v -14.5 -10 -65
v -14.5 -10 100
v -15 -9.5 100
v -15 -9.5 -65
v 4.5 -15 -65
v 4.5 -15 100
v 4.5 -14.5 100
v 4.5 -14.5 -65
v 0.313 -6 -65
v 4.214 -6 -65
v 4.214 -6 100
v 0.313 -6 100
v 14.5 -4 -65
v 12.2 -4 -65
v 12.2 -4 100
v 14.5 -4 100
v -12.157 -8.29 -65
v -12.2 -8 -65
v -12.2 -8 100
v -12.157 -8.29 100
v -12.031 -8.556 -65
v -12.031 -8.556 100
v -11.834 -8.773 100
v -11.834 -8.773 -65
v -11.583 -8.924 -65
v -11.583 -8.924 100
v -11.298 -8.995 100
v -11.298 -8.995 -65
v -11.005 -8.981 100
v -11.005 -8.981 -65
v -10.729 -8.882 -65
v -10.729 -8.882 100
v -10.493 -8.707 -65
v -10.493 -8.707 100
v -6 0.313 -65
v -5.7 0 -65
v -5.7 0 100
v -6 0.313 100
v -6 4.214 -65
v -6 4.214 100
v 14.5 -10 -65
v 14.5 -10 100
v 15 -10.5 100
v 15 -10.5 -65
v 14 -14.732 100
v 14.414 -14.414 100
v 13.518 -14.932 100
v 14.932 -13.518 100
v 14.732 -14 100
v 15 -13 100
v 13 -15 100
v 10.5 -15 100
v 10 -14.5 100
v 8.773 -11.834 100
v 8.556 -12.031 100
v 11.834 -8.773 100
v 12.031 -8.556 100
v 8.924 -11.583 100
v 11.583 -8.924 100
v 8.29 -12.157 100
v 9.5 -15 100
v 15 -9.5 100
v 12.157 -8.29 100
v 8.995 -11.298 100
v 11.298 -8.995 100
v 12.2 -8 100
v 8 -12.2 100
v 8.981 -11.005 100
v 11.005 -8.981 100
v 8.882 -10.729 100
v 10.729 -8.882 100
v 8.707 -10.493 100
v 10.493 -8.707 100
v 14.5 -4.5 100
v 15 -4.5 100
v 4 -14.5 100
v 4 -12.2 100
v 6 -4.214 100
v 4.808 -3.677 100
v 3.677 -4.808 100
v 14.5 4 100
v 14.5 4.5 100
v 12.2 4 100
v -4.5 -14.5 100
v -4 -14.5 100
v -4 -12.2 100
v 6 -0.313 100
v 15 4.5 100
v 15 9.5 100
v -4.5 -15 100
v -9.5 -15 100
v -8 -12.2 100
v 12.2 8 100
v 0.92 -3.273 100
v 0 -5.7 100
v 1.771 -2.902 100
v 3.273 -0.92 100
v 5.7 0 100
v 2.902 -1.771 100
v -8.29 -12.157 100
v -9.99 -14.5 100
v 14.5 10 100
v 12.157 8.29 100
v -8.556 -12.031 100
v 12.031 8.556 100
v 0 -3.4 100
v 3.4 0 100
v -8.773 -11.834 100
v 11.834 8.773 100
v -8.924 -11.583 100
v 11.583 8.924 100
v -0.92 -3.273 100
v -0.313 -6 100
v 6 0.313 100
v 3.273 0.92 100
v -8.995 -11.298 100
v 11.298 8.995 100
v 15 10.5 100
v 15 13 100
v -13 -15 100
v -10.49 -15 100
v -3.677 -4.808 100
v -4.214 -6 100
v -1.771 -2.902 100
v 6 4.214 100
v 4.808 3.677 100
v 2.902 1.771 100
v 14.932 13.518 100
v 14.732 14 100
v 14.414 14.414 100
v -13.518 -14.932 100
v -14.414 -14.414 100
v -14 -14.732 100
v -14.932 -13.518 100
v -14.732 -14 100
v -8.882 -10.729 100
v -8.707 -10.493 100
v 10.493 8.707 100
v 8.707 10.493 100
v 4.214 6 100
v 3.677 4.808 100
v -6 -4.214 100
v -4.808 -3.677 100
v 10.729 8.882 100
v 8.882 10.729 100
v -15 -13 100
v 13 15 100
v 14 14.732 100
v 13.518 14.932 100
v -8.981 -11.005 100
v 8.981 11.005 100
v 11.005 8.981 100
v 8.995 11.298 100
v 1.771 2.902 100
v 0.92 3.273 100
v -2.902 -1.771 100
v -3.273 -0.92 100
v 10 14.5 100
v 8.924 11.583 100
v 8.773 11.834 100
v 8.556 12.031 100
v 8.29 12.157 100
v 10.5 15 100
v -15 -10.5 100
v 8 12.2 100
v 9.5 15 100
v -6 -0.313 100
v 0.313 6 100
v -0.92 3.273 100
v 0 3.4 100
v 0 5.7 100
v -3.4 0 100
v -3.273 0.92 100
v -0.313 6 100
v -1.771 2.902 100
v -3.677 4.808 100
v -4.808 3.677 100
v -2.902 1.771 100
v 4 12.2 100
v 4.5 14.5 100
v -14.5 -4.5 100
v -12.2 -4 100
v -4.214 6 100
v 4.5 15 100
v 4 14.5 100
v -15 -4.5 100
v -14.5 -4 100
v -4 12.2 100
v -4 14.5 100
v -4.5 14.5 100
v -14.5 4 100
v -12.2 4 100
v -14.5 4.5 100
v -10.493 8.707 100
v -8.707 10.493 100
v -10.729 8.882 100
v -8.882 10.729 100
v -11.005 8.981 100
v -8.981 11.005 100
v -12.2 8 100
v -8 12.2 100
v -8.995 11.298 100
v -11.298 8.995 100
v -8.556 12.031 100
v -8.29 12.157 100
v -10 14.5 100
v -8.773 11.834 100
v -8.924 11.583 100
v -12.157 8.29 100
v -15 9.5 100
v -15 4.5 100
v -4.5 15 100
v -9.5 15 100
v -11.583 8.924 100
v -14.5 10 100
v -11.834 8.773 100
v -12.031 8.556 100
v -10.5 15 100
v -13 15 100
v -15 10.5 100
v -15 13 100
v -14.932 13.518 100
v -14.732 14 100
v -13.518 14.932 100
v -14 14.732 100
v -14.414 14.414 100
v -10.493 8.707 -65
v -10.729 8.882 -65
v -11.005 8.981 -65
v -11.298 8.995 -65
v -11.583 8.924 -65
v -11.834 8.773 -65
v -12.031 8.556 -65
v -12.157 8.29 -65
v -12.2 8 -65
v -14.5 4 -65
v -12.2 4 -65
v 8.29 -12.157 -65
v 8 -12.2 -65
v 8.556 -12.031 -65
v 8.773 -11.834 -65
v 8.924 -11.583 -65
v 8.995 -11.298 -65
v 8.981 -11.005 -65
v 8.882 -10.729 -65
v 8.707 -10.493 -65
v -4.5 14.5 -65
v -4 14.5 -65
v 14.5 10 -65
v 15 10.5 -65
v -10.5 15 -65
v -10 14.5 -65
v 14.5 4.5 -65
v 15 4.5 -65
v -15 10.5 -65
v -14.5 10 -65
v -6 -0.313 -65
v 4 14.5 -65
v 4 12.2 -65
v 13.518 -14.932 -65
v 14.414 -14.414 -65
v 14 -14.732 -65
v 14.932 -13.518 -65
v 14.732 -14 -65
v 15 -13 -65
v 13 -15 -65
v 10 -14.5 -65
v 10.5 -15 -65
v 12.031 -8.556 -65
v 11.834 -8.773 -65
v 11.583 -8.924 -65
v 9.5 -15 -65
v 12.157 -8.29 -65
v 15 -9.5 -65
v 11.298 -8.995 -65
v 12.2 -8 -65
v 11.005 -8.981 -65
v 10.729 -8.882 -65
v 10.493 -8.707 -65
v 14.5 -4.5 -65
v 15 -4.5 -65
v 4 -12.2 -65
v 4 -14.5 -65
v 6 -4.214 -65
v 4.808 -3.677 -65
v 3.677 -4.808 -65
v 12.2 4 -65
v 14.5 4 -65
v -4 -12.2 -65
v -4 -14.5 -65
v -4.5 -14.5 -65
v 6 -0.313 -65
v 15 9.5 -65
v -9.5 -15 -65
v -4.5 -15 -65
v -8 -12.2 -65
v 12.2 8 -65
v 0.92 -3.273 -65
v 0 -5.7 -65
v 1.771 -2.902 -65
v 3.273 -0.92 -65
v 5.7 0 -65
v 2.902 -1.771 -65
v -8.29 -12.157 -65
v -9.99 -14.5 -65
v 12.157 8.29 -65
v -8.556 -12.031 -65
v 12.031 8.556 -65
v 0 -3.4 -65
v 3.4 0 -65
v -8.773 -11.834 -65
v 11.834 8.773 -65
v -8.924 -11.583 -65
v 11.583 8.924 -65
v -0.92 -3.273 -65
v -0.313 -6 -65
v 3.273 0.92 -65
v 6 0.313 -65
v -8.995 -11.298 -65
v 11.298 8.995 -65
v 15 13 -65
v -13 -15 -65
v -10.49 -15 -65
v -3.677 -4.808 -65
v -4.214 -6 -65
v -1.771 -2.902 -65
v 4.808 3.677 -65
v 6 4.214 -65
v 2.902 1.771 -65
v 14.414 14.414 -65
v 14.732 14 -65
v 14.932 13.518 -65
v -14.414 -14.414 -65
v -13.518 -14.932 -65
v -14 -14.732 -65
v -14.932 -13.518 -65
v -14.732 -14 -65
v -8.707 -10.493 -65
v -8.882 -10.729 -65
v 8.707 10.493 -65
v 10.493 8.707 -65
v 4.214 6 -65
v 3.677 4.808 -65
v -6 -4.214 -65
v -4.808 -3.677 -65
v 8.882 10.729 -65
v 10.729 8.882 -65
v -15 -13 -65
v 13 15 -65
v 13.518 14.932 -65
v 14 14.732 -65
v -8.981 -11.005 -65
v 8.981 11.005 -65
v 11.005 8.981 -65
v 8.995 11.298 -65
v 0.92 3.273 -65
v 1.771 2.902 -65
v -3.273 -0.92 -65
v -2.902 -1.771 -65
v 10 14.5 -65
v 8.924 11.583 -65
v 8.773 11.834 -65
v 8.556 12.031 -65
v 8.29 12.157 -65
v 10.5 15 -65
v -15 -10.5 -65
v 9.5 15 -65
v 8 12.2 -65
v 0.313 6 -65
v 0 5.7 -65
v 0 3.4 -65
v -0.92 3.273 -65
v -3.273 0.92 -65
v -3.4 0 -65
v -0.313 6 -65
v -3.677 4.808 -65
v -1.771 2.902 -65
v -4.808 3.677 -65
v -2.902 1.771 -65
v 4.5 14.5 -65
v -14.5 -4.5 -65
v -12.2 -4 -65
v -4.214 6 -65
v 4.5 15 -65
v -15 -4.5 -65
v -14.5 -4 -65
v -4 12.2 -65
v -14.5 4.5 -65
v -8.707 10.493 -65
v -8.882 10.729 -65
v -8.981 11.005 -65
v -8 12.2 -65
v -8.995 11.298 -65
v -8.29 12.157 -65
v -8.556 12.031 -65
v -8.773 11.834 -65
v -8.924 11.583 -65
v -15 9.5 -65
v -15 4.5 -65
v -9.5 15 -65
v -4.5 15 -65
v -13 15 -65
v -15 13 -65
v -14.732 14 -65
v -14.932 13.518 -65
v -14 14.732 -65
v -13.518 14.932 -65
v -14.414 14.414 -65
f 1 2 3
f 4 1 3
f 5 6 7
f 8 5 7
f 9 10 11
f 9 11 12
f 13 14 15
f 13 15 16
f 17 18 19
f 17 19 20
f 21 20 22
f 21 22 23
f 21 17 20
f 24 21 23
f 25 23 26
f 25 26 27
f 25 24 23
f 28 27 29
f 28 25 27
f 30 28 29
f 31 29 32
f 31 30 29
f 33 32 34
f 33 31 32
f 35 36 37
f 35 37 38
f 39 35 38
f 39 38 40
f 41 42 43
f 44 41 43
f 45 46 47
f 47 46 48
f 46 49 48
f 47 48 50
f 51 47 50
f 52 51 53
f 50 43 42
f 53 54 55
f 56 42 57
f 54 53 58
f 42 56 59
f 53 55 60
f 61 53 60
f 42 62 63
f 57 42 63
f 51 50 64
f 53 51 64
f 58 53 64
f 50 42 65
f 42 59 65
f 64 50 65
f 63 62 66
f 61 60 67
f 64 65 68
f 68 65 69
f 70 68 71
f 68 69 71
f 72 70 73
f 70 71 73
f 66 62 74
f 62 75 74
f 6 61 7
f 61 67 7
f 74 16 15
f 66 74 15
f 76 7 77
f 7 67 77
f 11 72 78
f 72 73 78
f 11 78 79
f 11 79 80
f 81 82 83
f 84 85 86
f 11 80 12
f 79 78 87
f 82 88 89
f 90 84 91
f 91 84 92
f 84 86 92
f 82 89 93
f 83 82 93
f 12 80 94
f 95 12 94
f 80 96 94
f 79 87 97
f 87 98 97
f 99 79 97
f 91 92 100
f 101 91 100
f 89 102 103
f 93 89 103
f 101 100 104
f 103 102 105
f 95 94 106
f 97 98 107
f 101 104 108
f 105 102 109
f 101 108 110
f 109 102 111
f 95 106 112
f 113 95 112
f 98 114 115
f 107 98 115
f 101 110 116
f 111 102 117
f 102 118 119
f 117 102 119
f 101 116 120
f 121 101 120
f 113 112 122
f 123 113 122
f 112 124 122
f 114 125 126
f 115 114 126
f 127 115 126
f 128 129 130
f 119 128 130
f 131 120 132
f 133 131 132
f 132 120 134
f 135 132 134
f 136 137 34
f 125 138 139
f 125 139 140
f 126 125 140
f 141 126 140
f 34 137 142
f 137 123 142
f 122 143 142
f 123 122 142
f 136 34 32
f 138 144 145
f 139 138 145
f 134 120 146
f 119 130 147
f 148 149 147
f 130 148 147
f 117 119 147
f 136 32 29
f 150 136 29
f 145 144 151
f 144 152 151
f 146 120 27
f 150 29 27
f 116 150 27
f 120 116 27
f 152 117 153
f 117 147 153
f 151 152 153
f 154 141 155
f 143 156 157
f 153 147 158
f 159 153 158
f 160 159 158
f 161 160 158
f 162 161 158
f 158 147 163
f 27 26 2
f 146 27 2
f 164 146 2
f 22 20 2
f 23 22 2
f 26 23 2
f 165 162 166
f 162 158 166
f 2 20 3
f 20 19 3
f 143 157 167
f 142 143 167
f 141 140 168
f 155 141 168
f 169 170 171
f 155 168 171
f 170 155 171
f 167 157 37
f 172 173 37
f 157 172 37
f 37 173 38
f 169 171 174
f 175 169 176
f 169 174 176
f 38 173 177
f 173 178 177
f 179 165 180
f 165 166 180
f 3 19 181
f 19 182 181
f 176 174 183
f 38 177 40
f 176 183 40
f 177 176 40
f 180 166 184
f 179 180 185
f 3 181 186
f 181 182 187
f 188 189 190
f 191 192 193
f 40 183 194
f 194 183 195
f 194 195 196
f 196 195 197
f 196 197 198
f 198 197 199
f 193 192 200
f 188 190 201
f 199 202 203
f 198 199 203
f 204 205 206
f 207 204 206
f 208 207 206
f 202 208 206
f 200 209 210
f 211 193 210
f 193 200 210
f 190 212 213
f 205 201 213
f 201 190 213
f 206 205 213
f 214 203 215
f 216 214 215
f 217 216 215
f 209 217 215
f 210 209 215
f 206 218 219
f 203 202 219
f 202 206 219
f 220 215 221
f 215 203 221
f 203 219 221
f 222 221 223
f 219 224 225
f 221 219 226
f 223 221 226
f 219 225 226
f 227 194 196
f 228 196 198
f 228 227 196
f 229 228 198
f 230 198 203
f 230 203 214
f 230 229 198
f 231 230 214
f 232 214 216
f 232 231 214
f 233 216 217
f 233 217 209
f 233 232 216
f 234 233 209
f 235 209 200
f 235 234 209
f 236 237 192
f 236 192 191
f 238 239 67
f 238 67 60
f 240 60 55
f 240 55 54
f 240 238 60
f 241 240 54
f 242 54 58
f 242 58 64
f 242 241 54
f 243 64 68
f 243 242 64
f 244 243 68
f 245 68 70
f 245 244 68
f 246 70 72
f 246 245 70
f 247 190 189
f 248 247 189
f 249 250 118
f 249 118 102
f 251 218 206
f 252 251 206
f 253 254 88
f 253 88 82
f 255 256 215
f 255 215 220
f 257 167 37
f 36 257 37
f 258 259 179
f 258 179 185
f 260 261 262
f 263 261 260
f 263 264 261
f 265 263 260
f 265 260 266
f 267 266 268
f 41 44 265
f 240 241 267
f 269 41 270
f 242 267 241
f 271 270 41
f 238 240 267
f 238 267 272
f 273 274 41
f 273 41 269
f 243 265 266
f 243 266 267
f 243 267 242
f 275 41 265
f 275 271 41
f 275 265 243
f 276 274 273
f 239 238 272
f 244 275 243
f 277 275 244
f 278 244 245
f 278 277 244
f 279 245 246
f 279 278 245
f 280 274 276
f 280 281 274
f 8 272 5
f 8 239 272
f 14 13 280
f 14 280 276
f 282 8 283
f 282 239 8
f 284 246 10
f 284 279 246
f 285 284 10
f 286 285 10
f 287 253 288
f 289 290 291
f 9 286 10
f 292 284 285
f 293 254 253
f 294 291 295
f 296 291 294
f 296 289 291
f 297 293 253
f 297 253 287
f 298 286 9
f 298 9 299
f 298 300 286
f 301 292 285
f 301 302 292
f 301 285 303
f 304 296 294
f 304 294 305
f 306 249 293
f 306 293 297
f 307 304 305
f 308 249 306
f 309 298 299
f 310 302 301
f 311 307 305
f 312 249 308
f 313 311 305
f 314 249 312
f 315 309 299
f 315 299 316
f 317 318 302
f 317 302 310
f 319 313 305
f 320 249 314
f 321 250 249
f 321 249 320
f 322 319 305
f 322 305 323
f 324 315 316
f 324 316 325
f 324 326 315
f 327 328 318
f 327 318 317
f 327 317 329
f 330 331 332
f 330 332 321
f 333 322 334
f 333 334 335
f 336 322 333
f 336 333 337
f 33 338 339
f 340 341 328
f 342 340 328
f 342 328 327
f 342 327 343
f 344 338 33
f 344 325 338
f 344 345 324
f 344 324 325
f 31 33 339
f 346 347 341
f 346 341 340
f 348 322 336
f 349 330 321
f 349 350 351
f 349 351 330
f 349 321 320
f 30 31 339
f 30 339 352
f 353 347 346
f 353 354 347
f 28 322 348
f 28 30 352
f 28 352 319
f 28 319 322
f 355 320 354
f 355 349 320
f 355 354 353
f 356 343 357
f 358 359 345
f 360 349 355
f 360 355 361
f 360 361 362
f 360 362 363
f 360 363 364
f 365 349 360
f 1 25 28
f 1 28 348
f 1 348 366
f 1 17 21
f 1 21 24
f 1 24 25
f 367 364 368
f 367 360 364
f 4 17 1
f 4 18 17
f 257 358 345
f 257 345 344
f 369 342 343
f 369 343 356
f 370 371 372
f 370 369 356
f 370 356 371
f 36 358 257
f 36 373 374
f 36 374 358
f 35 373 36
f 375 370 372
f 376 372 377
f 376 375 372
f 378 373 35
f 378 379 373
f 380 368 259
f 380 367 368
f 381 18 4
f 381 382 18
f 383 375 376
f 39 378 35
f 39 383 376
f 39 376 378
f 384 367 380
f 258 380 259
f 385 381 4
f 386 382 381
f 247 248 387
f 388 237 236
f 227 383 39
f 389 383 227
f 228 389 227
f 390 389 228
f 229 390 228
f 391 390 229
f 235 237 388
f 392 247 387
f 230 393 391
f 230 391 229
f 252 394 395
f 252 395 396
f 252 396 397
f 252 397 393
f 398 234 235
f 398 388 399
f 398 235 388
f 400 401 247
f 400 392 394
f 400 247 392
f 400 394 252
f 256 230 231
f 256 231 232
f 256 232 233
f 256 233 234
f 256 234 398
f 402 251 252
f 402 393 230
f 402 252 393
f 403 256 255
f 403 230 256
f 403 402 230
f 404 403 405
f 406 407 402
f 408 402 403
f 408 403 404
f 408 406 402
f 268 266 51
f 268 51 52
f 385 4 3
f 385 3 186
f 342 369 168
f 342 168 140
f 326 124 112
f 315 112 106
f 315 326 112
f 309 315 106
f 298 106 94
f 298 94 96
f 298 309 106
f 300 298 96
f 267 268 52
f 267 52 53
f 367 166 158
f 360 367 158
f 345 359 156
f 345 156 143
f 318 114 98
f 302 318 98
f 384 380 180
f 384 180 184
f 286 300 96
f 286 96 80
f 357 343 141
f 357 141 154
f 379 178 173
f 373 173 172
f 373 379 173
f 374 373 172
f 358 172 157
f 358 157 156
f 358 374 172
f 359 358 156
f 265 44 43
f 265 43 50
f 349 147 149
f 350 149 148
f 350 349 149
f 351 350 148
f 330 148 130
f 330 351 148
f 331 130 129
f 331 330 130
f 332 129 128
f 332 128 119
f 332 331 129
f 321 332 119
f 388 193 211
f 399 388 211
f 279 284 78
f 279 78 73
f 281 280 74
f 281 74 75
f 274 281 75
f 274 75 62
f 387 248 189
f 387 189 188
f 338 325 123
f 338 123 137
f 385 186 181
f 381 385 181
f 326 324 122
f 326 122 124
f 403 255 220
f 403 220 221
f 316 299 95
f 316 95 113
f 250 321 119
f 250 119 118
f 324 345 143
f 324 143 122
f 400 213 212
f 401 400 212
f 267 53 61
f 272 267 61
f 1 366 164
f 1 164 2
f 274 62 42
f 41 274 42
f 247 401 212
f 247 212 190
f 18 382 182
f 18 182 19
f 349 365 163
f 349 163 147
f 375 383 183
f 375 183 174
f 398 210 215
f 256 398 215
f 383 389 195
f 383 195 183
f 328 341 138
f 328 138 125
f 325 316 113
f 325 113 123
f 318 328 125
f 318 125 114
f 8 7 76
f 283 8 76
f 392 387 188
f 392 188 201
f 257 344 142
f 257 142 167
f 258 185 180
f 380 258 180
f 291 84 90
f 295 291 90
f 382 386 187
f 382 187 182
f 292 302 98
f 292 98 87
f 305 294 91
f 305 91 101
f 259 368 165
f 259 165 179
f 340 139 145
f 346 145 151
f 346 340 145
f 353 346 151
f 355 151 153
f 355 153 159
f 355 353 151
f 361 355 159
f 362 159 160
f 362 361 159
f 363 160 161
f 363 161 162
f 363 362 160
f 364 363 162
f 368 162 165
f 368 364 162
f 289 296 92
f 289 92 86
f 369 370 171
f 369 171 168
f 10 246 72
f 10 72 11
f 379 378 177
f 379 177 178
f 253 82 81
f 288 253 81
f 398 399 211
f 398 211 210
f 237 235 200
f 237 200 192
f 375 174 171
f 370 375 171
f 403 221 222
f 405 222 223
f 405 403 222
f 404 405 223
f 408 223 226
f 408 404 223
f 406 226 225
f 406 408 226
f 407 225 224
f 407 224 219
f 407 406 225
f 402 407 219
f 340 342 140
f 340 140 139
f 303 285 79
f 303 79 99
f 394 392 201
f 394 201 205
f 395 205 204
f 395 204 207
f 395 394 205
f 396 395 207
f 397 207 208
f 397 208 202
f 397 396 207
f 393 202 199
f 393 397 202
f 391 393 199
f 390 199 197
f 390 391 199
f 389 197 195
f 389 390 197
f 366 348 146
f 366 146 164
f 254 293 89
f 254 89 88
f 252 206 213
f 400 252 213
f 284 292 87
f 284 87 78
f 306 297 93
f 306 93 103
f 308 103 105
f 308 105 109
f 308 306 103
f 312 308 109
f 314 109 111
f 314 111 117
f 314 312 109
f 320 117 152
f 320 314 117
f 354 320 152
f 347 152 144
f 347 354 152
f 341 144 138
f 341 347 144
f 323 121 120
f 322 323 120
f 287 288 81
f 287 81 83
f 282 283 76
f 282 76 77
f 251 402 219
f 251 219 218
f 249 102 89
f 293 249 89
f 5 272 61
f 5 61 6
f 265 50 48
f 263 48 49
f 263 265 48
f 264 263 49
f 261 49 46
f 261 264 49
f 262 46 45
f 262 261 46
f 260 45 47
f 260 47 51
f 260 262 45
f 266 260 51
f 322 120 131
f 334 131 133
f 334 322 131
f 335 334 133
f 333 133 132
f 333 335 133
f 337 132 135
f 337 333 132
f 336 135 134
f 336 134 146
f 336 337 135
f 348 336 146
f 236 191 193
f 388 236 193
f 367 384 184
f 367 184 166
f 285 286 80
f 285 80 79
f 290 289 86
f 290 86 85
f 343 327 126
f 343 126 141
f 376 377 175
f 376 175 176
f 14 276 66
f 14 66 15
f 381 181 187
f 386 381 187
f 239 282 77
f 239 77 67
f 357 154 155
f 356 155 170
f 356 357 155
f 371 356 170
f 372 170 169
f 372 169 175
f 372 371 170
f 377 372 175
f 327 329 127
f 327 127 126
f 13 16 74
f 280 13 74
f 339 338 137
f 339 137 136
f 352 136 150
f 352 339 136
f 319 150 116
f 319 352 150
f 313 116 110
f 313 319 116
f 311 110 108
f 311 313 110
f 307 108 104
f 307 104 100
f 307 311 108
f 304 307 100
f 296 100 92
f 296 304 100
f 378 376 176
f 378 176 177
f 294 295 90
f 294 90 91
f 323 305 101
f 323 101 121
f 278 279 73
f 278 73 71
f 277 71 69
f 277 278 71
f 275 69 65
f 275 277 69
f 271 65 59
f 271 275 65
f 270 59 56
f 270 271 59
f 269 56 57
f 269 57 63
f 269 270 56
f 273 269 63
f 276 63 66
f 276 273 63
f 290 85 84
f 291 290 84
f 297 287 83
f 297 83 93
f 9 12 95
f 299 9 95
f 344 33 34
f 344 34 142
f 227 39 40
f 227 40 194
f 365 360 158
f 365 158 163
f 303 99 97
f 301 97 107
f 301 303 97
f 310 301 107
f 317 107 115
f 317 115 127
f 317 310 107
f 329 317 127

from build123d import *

# Parameters (mm, degrees)
BOSS_EXTRUDE1_DEPTH = 165


with BuildPart() as part:
    # Sketch1 → Boss-Extrude1 (new body)
    with BuildSketch(Plane(origin=(0, 0, -65), x_dir=(-1, 0, 0), z_dir=(0, 0, -1))):
        with BuildLine():
            Line((-14.999999999, 12.999999999), (-14.999999999, 10.499999999))
            Line((-14.999999999, 10.499999999), (-14.499999999, 9.999999999))
            Line((-14.499999999, 9.999999999), (-14.999999999, 9.5))
            Line((-14.999999999, 9.5), (-14.999999999, 4.5))
            Line((-14.999999999, 4.5), (-14.5, 4.5))
            Line((-14.5, 4.5), (-14.5, 4))
            Line((-14.5, 4), (-12.200000005, 4))
            Line((-12.200000005, 4), (-12.200000005, 7.999999995))
            ThreePointArc((-12.200000005, 7.999999995), (-11.582683434, 8.923879532), (-10.492893215, 8.70710678))
            Line((-10.492893215, 8.70710678), (-6, 4.214213564))
            Line((-6, 4.214213564), (-6, 0.312520903))
            Line((-6, 0.312520903), (-5.7, 0))
            Line((-5.7, 0), (-6, -0.312520901))
            Line((-6, -0.312520901), (-6, -4.214213564))
            Line((-6, -4.214213564), (-10.492893215, -8.70710678))
            ThreePointArc((-10.492893215, -8.70710678), (-11.582683434, -8.923879532), (-12.200000005, -7.999999995))
            Line((-12.200000005, -7.999999995), (-12.200000005, -4))
            Line((-12.200000005, -4), (-14.5, -4))
            Line((-14.5, -4), (-14.5, -4.5))
            Line((-14.5, -4.5), (-14.999999999, -4.5))
            Line((-14.999999999, -4.5), (-14.999999999, -9.500000003))
            Line((-14.999999999, -9.500000003), (-14.499999999, -10.000000002))
            Line((-14.499999999, -10.000000002), (-14.999999999, -10.500000001))
            Line((-14.999999999, -10.500000001), (-14.999999999, -13))
            ThreePointArc((-14.999999999, -13), (-14.414213561, -14.414213562), (-12.999999999, -15))
            Line((-12.999999999, -15), (-10.5, -15))
            Line((-10.5, -15), (-10.000000001, -14.500000001))
            Line((-10.000000001, -14.500000001), (-9.500000001, -15))
            Line((-9.500000001, -15), (-4.5, -15))
            Line((-4.5, -15), (-4.5, -14.5))
            Line((-4.5, -14.5), (-4, -14.5))
            Line((-4, -14.5), (-4, -12.200000005))
            Line((-4, -12.200000005), (-7.999999995, -12.200000005))
            ThreePointArc((-7.999999995, -12.200000005), (-8.923879532, -11.582683434), (-8.70710678, -10.492893215))
            Line((-8.70710678, -10.492893215), (-4.214213564, -6))
            Line((-4.214213564, -6), (-0.312520903, -6))
            Line((-0.312520903, -6), (0, -5.7))
            Line((0, -5.7), (0.312520901, -6))
            Line((0.312520901, -6), (4.214213564, -6))
            Line((4.214213564, -6), (8.70710678, -10.492893215))
            ThreePointArc((8.70710678, -10.492893215), (8.923879532, -11.582683434), (7.999999995, -12.200000005))
            Line((7.999999995, -12.200000005), (4, -12.200000005))
            Line((4, -12.200000005), (4, -14.5))
            Line((4, -14.5), (4.5, -14.5))
            Line((4.5, -14.5), (4.5, -15))
            Line((4.5, -15), (9.500000001, -15))
            Line((9.500000001, -15), (9.989897949, -14.5))
            Line((9.989897949, -14.5), (10.489897949, -15))
            Line((10.489897949, -15), (13, -15))
            ThreePointArc((13, -15), (14.414213562, -14.414213562), (15, -13))
            Line((15, -13), (15, -10.5))
            Line((15, -10.5), (14.500000001, -10.000000001))
            Line((14.500000001, -10.000000001), (15, -9.500000001))
            Line((15, -9.500000001), (15, -4.5))
            Line((15, -4.5), (14.5, -4.5))
            Line((14.5, -4.5), (14.5, -4))
            Line((14.5, -4), (12.200000005, -4))
            Line((12.200000005, -4), (12.200000005, -7.999999995))
            ThreePointArc((12.200000005, -7.999999995), (11.582683434, -8.923879532), (10.492893215, -8.70710678))
            Line((10.492893215, -8.70710678), (6, -4.214213564))
            Line((6, -4.214213564), (6, -0.312520903))
            Line((6, -0.312520903), (5.7, 0))
            Line((5.7, 0), (6, 0.312520901))
            Line((6, 0.312520901), (6, 4.214213564))
            Line((6, 4.214213564), (10.492893215, 8.707106779))
            ThreePointArc((10.492893215, 8.707106779), (11.582683434, 8.923879532), (12.200000005, 7.999999994))
            Line((12.200000005, 7.999999994), (12.200000005, 4))
            Line((12.200000005, 4), (14.5, 4))
            Line((14.5, 4), (14.5, 4.5))
            Line((14.5, 4.5), (15, 4.5))
            Line((15, 4.5), (15, 9.500000001))
            Line((15, 9.500000001), (14.500000001, 10.000000001))
            Line((14.500000001, 10.000000001), (15, 10.5))
            Line((15, 10.5), (15, 12.999999999))
            ThreePointArc((15, 12.999999999), (14.414213562, 14.414213561), (13, 14.999999999))
            Line((13, 14.999999999), (10.500000001, 14.999999999))
            Line((10.500000001, 14.999999999), (10.000000002, 14.499999999))
            Line((10.000000002, 14.499999999), (9.500000003, 14.999999999))
            Line((9.500000003, 14.999999999), (4.5, 14.999999999))
            Line((4.5, 14.999999999), (4.5, 14.5))
            Line((4.5, 14.5), (4, 14.5))
            Line((4, 14.5), (4, 12.200000005))
            Line((4, 12.200000005), (7.999999995, 12.200000005))
            ThreePointArc((7.999999995, 12.200000005), (8.923879532, 11.582683434), (8.70710678, 10.492893215))
            Line((8.70710678, 10.492893215), (4.214213564, 6))
            Line((4.214213564, 6), (0.312520903, 6))
            Line((0.312520903, 6), (0, 5.7))
            Line((0, 5.7), (-0.312520901, 6))
            Line((-0.312520901, 6), (-4.214213564, 6))
            Line((-4.214213564, 6), (-8.707106779, 10.492893215))
            ThreePointArc((-8.707106779, 10.492893215), (-8.923879532, 11.582683434), (-7.999999994, 12.200000005))
            Line((-7.999999994, 12.200000005), (-4, 12.200000005))
            Line((-4, 12.200000005), (-4, 14.5))
            Line((-4, 14.5), (-4.5, 14.5))
            Line((-4.5, 14.5), (-4.5, 14.999999999))
            Line((-4.5, 14.999999999), (-9.5, 14.999999999))
            Line((-9.5, 14.999999999), (-9.999999999, 14.499999999))
            Line((-9.999999999, 14.499999999), (-10.499999999, 14.999999999))
            Line((-10.499999999, 14.999999999), (-12.999999999, 14.999999999))
            ThreePointArc((-12.999999999, 14.999999999), (-14.414213561, 14.414213561), (-14.999999999, 12.999999999))
        make_face()
        with BuildLine():
            Line((4.808326112, 3.676955262), (2.902349714, 1.770978864))
            ThreePointArc((2.902349714, 1.770978864), (3.4, 0), (2.902349714, -1.770978864))
            Line((2.902349714, -1.770978864), (4.808326112, -3.676955262))
            Line((4.808326112, -3.676955262), (3.676955262, -4.808326112))
            Line((3.676955262, -4.808326112), (1.770978864, -2.902349714))
            ThreePointArc((1.770978864, -2.902349714), (0, -3.4), (-1.770978864, -2.902349714))
            Line((-1.770978864, -2.902349714), (-3.676955262, -4.808326112))
            Line((-3.676955262, -4.808326112), (-4.808326112, -3.676955262))
            Line((-4.808326112, -3.676955262), (-2.902349714, -1.770978864))
            ThreePointArc((-2.902349714, -1.770978864), (-3.4, 0), (-2.902349714, 1.770978864))
            Line((-2.902349714, 1.770978864), (-4.808326112, 3.676955262))
            Line((-4.808326112, 3.676955262), (-3.676955262, 4.808326112))
            Line((-3.676955262, 4.808326112), (-1.770978864, 2.902349714))
            ThreePointArc((-1.770978864, 2.902349714), (0, 3.4), (1.770978864, 2.902349714))
            Line((1.770978864, 2.902349714), (3.676955262, 4.808326112))
            Line((3.676955262, 4.808326112), (4.808326112, 3.676955262))
        make_face(mode=Mode.SUBTRACT)
    extrude(amount=-BOSS_EXTRUDE1_DEPTH)


solid = part.part
